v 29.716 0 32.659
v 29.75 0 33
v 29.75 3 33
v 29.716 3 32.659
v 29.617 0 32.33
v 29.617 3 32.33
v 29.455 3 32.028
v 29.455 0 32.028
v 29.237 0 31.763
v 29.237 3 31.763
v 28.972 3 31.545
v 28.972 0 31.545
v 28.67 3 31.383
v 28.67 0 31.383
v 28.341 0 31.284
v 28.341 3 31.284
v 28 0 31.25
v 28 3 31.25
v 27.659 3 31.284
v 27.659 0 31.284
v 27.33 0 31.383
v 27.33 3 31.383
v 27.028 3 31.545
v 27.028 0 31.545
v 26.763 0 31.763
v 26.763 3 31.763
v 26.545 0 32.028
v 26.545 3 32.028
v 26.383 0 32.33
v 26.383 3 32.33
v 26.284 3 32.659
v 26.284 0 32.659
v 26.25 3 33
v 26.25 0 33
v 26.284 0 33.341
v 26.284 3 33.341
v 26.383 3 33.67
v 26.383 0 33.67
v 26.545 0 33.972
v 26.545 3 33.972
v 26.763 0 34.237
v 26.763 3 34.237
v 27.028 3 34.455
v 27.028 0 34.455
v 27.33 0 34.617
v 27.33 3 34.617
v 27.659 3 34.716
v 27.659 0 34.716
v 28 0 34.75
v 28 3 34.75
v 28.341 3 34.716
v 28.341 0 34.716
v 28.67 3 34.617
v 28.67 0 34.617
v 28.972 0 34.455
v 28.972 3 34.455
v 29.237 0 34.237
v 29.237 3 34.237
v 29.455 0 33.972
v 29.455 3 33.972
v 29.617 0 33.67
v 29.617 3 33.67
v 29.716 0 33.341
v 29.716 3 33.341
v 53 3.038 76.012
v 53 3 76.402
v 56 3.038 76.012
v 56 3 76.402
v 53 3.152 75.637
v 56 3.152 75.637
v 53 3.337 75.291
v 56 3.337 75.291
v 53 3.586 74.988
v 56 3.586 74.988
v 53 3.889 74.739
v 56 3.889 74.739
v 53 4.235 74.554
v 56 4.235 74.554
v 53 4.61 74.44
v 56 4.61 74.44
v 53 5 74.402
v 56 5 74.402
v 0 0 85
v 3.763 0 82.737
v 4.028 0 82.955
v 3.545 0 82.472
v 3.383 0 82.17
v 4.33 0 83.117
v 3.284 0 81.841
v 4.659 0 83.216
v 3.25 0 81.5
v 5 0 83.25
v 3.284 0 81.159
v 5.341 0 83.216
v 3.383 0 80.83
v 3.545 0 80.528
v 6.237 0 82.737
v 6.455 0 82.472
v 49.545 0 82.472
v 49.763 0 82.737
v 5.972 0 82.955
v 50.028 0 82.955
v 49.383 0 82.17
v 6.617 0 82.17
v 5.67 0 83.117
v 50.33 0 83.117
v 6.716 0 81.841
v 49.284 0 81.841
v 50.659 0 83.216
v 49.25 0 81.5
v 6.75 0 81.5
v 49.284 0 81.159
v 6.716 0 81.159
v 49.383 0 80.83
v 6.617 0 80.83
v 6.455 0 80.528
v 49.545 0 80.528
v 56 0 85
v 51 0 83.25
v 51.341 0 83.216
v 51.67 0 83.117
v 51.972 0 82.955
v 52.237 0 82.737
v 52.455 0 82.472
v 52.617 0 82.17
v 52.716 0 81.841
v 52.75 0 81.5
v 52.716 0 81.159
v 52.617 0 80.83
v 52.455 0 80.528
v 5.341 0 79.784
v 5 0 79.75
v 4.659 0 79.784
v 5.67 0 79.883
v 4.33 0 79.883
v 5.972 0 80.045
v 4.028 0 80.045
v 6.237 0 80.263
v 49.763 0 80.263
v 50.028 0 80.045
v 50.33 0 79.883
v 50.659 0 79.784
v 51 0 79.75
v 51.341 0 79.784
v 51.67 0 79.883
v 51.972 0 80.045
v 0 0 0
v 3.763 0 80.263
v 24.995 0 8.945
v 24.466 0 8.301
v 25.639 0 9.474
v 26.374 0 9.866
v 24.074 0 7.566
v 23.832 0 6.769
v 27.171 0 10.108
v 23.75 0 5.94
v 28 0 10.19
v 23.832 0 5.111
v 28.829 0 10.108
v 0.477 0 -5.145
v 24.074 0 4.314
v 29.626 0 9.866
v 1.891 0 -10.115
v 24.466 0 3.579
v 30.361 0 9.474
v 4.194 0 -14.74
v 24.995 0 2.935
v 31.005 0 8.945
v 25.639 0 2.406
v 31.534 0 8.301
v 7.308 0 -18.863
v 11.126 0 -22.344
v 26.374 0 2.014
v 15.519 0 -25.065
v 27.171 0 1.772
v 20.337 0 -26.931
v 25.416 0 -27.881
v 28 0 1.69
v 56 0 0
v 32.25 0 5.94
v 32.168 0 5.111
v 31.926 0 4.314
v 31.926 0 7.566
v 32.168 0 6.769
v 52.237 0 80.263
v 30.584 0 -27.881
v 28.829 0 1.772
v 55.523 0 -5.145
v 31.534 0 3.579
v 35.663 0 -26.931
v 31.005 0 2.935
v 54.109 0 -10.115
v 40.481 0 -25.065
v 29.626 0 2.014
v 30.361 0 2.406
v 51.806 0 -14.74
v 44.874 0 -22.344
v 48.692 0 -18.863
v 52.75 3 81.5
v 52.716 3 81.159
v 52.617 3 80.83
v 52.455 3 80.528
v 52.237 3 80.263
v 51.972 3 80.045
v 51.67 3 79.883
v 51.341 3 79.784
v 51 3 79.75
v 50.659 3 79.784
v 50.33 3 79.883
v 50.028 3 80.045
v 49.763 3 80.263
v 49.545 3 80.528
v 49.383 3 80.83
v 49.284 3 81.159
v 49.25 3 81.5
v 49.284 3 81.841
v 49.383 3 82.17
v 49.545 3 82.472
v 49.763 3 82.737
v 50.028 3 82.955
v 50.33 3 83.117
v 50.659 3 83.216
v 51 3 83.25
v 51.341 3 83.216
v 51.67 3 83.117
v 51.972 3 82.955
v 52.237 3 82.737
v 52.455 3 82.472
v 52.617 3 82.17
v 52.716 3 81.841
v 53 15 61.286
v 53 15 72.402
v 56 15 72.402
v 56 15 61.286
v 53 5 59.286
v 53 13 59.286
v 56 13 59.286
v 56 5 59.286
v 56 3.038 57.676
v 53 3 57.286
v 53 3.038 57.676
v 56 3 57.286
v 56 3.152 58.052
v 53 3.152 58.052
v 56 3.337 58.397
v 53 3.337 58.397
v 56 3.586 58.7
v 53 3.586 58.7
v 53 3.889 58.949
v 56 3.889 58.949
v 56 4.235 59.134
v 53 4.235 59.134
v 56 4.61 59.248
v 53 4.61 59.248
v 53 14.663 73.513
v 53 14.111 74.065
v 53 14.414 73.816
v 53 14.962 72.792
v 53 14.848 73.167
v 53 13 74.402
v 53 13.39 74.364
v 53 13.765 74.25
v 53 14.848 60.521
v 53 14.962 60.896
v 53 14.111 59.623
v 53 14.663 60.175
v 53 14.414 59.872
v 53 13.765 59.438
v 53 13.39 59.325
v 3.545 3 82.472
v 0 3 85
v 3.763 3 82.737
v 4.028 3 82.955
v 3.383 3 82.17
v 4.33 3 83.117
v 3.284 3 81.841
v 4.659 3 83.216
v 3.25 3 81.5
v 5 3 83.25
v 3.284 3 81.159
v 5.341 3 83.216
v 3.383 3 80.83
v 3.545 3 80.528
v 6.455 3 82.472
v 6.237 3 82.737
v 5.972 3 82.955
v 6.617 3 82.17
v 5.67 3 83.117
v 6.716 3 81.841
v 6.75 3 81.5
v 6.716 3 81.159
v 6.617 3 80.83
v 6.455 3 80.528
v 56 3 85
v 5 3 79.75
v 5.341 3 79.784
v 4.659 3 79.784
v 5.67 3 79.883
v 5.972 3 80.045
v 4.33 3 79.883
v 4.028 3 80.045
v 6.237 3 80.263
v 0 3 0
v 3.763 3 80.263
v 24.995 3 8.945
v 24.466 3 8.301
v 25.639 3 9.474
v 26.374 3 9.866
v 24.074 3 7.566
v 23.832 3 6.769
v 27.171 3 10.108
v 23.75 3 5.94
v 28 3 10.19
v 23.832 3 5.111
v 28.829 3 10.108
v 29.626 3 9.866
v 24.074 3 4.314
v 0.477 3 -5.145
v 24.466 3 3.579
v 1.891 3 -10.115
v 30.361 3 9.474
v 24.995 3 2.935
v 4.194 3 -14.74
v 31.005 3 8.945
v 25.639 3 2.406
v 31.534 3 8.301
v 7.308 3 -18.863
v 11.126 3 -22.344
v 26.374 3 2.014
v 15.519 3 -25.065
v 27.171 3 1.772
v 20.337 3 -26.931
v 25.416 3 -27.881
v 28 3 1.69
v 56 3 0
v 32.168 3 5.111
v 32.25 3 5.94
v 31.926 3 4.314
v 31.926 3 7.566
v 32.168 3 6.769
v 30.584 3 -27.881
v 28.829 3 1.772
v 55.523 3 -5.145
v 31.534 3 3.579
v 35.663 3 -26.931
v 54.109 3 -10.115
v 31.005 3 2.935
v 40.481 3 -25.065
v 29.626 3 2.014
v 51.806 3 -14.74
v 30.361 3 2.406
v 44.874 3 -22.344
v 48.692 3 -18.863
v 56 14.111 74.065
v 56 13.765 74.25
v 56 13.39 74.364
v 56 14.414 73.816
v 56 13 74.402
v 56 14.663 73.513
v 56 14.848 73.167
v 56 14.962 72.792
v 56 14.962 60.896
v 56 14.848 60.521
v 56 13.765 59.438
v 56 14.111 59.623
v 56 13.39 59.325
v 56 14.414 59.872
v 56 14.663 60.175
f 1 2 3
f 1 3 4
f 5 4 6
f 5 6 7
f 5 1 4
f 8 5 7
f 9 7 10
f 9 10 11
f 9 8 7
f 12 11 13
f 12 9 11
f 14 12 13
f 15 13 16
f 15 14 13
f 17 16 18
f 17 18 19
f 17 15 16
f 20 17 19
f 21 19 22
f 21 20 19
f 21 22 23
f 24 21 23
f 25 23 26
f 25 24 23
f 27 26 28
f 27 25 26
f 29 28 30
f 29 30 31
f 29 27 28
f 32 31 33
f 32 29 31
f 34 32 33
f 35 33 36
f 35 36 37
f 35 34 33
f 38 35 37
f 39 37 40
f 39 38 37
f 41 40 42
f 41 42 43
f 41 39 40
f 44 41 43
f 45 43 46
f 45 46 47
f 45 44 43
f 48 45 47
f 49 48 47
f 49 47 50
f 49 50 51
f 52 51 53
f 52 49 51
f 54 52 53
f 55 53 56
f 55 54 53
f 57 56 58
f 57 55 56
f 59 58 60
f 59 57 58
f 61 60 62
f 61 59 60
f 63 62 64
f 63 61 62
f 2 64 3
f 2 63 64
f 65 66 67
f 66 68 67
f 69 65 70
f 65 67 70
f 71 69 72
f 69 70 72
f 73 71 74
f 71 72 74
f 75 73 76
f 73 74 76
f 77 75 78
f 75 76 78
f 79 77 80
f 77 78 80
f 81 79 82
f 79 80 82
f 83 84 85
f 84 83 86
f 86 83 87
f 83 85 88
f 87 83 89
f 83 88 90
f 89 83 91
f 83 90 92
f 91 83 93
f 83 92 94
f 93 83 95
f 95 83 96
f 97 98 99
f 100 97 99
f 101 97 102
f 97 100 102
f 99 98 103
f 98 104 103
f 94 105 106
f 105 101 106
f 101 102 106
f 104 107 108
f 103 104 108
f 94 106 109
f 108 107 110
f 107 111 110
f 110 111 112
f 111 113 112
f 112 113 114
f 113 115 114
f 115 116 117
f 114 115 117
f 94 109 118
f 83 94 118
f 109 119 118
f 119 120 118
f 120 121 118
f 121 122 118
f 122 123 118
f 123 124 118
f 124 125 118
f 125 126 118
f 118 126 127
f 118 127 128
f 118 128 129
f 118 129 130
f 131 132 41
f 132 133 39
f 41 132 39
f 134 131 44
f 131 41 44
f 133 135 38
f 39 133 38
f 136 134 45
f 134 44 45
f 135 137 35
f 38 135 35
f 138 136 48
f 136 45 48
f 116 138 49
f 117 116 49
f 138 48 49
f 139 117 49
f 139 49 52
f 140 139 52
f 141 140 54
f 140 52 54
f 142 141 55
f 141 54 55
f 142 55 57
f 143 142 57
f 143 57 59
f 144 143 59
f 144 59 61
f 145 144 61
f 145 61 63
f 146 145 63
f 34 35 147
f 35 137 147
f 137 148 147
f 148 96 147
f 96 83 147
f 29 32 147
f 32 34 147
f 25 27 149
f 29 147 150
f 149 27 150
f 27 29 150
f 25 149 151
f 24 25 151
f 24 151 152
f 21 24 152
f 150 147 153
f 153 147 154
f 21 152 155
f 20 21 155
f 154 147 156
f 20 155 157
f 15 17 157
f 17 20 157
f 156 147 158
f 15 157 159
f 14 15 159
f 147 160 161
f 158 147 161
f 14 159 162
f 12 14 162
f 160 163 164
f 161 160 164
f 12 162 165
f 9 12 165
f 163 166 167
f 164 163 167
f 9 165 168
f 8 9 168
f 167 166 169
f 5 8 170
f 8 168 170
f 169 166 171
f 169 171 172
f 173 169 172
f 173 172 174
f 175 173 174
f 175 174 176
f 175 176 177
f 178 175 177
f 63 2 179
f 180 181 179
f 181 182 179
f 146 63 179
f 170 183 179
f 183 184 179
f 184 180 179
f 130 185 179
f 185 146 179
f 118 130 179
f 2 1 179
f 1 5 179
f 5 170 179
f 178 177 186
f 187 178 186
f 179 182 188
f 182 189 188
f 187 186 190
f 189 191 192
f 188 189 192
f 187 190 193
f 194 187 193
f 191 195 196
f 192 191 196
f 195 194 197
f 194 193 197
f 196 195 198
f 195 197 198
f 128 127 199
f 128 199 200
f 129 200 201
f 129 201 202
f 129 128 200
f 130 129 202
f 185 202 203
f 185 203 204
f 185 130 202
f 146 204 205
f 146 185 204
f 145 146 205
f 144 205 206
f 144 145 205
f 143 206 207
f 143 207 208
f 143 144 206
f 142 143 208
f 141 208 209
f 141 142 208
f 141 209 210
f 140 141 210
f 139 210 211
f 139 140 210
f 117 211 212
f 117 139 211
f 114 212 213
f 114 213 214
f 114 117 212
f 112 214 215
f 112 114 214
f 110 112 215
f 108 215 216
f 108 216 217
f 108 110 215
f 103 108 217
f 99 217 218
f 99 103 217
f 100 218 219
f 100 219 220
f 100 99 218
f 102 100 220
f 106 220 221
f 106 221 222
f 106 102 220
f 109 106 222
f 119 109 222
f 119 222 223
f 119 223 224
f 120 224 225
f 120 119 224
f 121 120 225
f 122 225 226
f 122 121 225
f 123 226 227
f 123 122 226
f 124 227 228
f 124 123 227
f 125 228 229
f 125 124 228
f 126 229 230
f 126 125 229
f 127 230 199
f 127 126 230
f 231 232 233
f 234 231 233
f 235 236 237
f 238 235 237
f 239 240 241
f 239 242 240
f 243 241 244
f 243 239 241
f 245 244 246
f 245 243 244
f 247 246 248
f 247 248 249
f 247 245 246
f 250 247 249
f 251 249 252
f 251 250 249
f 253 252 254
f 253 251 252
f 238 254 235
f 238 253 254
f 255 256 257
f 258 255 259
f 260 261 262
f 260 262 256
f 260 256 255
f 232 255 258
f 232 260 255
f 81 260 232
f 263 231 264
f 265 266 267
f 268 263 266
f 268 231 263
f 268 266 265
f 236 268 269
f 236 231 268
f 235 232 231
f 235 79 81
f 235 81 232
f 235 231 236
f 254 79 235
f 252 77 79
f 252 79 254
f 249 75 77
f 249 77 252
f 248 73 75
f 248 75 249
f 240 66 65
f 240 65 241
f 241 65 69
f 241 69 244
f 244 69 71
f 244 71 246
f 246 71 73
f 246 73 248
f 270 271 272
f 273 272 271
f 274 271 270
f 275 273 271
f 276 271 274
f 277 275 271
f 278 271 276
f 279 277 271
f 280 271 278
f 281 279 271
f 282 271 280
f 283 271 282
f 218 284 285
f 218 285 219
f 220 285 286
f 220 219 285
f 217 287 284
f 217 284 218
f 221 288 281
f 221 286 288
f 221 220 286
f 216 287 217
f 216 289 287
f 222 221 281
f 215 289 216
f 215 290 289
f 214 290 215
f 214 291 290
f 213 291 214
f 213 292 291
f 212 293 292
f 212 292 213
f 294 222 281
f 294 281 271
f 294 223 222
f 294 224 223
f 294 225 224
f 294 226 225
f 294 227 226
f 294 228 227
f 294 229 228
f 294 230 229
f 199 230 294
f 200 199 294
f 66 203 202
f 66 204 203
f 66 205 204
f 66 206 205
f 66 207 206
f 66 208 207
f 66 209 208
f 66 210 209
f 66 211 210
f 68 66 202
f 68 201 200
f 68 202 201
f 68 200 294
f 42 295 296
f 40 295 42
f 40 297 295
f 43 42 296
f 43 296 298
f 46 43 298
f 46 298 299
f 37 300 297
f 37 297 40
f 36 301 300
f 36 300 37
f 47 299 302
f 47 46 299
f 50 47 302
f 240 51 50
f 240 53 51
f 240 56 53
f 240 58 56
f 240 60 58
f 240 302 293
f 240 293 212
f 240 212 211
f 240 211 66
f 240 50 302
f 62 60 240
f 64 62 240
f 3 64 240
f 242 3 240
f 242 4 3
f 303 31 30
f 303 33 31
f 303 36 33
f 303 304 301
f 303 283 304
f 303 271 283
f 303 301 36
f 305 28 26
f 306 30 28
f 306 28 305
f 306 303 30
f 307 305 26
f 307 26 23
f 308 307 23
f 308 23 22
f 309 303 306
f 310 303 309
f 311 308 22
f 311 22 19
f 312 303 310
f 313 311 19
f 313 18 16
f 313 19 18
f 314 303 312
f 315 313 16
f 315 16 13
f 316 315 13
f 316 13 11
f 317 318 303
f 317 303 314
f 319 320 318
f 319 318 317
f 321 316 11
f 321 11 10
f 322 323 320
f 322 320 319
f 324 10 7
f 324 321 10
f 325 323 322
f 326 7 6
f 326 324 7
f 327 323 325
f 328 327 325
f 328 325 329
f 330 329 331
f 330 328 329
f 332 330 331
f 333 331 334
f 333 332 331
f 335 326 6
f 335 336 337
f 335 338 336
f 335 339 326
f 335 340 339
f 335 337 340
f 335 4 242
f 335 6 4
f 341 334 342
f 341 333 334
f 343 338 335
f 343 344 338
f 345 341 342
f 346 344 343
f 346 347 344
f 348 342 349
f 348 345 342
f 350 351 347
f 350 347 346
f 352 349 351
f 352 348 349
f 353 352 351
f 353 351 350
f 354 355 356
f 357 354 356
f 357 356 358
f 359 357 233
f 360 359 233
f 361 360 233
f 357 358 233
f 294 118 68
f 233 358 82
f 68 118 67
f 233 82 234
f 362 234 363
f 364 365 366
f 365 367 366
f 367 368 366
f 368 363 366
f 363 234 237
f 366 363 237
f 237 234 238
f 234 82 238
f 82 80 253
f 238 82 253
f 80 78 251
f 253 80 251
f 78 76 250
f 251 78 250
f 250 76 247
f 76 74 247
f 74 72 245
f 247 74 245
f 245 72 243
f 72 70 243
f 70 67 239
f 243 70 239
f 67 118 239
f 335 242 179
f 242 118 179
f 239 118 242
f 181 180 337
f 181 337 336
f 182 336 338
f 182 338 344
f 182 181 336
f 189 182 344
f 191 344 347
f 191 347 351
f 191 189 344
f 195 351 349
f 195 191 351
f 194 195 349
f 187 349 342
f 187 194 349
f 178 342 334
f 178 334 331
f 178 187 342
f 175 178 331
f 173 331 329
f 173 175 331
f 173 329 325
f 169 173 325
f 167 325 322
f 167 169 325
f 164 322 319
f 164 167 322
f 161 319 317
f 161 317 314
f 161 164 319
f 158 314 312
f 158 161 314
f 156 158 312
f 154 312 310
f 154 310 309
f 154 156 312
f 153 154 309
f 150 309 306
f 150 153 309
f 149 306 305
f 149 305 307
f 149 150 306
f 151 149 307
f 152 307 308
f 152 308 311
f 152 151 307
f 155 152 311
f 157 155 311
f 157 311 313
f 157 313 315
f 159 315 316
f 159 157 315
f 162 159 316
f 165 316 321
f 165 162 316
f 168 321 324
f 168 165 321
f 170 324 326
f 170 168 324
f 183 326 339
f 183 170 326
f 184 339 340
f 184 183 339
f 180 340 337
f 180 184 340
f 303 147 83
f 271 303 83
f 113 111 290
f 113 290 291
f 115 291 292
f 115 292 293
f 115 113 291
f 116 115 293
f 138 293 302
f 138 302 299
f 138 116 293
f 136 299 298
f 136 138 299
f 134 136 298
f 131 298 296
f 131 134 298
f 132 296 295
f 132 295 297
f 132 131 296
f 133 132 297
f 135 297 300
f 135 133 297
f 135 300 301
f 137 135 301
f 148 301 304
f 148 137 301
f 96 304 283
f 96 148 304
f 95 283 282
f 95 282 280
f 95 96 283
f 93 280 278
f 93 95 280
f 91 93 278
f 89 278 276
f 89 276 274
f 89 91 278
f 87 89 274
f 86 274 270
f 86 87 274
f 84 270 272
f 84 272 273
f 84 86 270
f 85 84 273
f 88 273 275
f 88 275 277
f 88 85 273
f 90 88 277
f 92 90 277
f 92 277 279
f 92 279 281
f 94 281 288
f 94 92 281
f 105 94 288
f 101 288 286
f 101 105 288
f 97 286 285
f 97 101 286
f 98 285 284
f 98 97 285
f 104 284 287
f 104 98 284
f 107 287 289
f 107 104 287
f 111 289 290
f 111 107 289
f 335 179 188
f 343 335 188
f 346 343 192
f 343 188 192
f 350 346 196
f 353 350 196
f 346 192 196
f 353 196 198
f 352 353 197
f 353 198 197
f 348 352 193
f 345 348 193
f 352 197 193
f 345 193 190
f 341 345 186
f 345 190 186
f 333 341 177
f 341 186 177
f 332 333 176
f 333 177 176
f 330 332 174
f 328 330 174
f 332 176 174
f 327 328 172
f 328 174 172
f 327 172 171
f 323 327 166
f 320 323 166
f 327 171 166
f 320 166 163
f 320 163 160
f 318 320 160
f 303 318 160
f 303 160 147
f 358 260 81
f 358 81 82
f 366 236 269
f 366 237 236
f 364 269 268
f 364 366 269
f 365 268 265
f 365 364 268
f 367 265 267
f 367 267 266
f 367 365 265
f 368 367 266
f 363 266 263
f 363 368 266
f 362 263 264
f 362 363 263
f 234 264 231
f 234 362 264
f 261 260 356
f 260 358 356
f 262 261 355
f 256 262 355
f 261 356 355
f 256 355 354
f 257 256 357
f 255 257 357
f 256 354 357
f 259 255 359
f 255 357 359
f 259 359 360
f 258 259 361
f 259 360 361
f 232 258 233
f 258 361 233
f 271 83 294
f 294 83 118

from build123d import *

# Parameters (mm, degrees)
SKETCH1_R           = 1.75
SKETCH1_R_2         = 4.25
BOSS_EXTRUDE1_DEPTH = 3
SKETCH2_W           = 3
SKETCH2_H           = 15.115775603
BOSS_EXTRUDE2_DEPTH = 12
FILLET1_R           = 2


with BuildPart() as part:
    # Sketch1 → Boss-Extrude1 (new body)
    with BuildSketch(Plane(origin=(0, 0, 0), x_dir=(1, 0, 0), z_dir=(0, 1, 0))):
        with BuildLine():
            Line((0, 0), (0, -85))
            Line((0, -85), (56, -85))
            Line((56, -85), (56, 6.6e-08))
            ThreePointArc((56, 6.6e-08), (27.999999967, 28.000000033), (0, 0))
        make_face()
        with Locations((5, -81.5)):
            Circle(SKETCH1_R, mode=Mode.SUBTRACT)
        with Locations((51, -81.5)):
            Circle(SKETCH1_R, mode=Mode.SUBTRACT)
        with Locations((28, -33)):
            Circle(SKETCH1_R, mode=Mode.SUBTRACT)
        with Locations((28, -5.94)):
            Circle(SKETCH1_R_2, mode=Mode.SUBTRACT)
    extrude(amount=BOSS_EXTRUDE1_DEPTH)

    # Sketch2 → Boss-Extrude2 (add)
    with BuildSketch(Plane(origin=(0, 3, 0), x_dir=(1, 0, 0), z_dir=(0, 1, 0))):
        with Locations((54.5, -66.844146369)):
            Rectangle(SKETCH2_W, SKETCH2_H)
    extrude(amount=BOSS_EXTRUDE2_DEPTH)

    # Fillet1
    fillet1_edges = [part.edges().sort_by_distance(p)[0] for p in [
        (54.5, 3, 59.286258567),
        (54.5, 3, 74.40203417),
        (54.5, 15, 59.286258567),
        (54.5, 15, 74.40203417),
    ]]
    fillet(fillet1_edges, radius=FILLET1_R)


solid = part.part
